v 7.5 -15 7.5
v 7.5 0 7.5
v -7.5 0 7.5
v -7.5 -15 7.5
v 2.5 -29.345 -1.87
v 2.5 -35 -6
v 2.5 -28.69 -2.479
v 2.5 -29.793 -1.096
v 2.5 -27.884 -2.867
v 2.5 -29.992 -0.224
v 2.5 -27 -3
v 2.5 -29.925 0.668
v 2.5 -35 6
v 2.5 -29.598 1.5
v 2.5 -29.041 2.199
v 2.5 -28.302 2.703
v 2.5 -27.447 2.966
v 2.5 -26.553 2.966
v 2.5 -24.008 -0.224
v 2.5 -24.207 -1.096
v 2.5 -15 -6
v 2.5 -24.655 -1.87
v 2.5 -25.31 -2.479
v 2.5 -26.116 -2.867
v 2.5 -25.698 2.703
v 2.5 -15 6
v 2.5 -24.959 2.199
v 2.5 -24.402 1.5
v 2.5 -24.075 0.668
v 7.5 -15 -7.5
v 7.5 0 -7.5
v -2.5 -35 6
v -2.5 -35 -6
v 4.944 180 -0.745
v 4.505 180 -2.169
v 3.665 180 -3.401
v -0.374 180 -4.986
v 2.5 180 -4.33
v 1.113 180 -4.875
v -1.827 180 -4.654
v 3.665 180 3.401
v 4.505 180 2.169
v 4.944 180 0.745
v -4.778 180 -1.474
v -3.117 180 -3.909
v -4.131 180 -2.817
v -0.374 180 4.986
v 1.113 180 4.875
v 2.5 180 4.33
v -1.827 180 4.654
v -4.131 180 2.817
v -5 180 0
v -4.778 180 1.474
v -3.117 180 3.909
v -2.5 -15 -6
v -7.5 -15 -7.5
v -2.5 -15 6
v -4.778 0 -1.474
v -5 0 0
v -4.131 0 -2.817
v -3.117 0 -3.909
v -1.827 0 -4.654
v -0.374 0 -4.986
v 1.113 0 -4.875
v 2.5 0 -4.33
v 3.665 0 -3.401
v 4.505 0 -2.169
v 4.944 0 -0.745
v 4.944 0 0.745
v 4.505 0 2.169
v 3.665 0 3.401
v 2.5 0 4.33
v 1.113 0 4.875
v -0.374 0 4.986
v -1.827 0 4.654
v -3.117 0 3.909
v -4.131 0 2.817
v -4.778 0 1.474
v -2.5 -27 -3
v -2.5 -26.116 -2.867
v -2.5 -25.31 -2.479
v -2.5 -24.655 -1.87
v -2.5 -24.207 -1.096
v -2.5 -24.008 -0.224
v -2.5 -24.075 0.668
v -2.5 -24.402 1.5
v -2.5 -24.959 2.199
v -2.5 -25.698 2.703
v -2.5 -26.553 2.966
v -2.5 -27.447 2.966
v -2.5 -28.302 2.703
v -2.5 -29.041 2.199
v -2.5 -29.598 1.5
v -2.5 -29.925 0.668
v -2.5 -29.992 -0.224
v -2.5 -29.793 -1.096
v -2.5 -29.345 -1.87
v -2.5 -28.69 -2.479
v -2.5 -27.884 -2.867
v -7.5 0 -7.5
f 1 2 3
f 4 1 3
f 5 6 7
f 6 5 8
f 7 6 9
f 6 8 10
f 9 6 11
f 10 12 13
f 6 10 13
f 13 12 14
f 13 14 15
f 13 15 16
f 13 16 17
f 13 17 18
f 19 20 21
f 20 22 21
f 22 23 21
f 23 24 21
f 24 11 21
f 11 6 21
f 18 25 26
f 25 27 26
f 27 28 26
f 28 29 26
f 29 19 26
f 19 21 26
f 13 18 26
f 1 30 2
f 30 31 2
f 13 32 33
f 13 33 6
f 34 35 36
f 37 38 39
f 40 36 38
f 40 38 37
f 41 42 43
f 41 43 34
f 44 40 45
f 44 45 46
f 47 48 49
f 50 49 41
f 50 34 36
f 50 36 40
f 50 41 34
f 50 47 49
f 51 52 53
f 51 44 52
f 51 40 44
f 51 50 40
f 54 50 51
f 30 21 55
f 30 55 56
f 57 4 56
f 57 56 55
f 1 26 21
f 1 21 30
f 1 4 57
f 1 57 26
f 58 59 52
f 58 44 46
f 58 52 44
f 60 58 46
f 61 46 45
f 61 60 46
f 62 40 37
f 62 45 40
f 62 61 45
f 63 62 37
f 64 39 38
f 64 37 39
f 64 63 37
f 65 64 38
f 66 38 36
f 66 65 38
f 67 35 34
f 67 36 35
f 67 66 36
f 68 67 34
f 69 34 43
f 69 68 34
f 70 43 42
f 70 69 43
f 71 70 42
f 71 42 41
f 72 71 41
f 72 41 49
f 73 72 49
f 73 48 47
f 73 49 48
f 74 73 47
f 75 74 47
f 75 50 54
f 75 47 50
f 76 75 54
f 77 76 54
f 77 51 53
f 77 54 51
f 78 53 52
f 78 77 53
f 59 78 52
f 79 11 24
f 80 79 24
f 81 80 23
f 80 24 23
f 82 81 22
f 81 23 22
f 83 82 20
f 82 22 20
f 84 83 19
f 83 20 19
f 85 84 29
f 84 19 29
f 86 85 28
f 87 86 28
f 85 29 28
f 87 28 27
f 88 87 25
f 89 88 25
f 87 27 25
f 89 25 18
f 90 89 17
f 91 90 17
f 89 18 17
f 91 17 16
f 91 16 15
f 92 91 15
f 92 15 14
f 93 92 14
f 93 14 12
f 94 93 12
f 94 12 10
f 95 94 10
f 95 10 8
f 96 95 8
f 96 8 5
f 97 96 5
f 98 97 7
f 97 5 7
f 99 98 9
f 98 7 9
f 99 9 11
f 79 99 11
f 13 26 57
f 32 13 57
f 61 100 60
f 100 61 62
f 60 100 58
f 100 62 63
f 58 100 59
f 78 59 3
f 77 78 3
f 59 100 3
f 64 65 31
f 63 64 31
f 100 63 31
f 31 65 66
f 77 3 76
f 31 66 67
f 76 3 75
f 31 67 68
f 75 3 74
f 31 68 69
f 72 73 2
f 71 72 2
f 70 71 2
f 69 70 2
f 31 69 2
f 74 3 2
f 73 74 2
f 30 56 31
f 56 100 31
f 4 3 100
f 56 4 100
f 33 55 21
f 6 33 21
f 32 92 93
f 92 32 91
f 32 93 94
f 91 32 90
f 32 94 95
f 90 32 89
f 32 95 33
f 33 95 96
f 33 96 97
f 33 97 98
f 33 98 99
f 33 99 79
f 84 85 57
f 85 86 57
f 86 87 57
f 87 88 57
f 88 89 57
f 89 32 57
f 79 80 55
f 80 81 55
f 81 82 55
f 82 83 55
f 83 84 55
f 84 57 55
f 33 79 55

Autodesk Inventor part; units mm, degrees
ref_plane "YZ Plane" through (0, 0, 0) normal (1, 0, 0) x (0, 1, 0)
ref_plane "XZ Plane" through (0, 0, 0) normal (0, 1, 0) x (-1, 0, 0)
ref_plane "XY Plane" through (0, 0, 0) normal (0, 0, 1) x (1, 0, 0)
sketch "Boceto3" plane through (0, 0, 0) normal (0, 1, 0) x (-1, 0, 0)
  circle A0 centre (0, 0) radius 5
  dimension "d21" = 10
extrude "Extrusión2" add sketch "Boceto3" along normal blind 180
sketch "Boceto4" plane through (0, 0, 0) normal (0, -1, 0) x (1, 0, 0)
  line L0 (-7.5, -7.5) -> (7.5, -7.5)
  line L1 (7.5, -7.5) -> (7.5, 7.5)
  line L2 (7.5, 7.5) -> (-7.5, 7.5)
  line L3 (-7.5, 7.5) -> (-7.5, -7.5)
  line L4 (-7.5, -7.5) -> (7.5, 7.5) construction
  line L5 (7.5, -7.5) -> (-7.5, 7.5) construction
  point P0 (0, 0)
  dimension "d24" = 15
  dimension "d25" = 15
extrude "Extrusión3" add sketch "Boceto4" along normal blind 15
sketch "Boceto5" plane through (0, -15, 0) normal (0, -1, 0) x (1, 0, 0)
  line L0 (2.5, 6) -> (-2.5, 6)
  line L1 (-2.5, 6) -> (-2.5, -6)
  line L2 (-2.5, -6) -> (2.5, -6)
  line L3 (2.5, -6) -> (2.5, 6)
  line L4 (2.5, 6) -> (-2.5, -6) construction
  line L5 (-2.5, 6) -> (2.5, -6) construction
  point P0 (0, 0)
  dimension "d28" = 5
  dimension "d29" = 12
extrude "Extrusión4" add sketch "Boceto5" along normal blind 20
sketch "Boceto6" plane through (2.5, -15, 6) normal (1, 0, 0) x (0, 0, -1)
  line L0 (12, -20) -> (0, -20) projected
  line L1 (6, -20) -> (6, -12)
  circle A0 centre (6, -12) radius 3
  point P0 (6, 15)
  dimension "d32" = 8
  dimension "d33" = 6
extrude "Extrusión5" cut sketch "Boceto6" against normal blind 20
properties part number "pendulum" material "Plástico ABS"
